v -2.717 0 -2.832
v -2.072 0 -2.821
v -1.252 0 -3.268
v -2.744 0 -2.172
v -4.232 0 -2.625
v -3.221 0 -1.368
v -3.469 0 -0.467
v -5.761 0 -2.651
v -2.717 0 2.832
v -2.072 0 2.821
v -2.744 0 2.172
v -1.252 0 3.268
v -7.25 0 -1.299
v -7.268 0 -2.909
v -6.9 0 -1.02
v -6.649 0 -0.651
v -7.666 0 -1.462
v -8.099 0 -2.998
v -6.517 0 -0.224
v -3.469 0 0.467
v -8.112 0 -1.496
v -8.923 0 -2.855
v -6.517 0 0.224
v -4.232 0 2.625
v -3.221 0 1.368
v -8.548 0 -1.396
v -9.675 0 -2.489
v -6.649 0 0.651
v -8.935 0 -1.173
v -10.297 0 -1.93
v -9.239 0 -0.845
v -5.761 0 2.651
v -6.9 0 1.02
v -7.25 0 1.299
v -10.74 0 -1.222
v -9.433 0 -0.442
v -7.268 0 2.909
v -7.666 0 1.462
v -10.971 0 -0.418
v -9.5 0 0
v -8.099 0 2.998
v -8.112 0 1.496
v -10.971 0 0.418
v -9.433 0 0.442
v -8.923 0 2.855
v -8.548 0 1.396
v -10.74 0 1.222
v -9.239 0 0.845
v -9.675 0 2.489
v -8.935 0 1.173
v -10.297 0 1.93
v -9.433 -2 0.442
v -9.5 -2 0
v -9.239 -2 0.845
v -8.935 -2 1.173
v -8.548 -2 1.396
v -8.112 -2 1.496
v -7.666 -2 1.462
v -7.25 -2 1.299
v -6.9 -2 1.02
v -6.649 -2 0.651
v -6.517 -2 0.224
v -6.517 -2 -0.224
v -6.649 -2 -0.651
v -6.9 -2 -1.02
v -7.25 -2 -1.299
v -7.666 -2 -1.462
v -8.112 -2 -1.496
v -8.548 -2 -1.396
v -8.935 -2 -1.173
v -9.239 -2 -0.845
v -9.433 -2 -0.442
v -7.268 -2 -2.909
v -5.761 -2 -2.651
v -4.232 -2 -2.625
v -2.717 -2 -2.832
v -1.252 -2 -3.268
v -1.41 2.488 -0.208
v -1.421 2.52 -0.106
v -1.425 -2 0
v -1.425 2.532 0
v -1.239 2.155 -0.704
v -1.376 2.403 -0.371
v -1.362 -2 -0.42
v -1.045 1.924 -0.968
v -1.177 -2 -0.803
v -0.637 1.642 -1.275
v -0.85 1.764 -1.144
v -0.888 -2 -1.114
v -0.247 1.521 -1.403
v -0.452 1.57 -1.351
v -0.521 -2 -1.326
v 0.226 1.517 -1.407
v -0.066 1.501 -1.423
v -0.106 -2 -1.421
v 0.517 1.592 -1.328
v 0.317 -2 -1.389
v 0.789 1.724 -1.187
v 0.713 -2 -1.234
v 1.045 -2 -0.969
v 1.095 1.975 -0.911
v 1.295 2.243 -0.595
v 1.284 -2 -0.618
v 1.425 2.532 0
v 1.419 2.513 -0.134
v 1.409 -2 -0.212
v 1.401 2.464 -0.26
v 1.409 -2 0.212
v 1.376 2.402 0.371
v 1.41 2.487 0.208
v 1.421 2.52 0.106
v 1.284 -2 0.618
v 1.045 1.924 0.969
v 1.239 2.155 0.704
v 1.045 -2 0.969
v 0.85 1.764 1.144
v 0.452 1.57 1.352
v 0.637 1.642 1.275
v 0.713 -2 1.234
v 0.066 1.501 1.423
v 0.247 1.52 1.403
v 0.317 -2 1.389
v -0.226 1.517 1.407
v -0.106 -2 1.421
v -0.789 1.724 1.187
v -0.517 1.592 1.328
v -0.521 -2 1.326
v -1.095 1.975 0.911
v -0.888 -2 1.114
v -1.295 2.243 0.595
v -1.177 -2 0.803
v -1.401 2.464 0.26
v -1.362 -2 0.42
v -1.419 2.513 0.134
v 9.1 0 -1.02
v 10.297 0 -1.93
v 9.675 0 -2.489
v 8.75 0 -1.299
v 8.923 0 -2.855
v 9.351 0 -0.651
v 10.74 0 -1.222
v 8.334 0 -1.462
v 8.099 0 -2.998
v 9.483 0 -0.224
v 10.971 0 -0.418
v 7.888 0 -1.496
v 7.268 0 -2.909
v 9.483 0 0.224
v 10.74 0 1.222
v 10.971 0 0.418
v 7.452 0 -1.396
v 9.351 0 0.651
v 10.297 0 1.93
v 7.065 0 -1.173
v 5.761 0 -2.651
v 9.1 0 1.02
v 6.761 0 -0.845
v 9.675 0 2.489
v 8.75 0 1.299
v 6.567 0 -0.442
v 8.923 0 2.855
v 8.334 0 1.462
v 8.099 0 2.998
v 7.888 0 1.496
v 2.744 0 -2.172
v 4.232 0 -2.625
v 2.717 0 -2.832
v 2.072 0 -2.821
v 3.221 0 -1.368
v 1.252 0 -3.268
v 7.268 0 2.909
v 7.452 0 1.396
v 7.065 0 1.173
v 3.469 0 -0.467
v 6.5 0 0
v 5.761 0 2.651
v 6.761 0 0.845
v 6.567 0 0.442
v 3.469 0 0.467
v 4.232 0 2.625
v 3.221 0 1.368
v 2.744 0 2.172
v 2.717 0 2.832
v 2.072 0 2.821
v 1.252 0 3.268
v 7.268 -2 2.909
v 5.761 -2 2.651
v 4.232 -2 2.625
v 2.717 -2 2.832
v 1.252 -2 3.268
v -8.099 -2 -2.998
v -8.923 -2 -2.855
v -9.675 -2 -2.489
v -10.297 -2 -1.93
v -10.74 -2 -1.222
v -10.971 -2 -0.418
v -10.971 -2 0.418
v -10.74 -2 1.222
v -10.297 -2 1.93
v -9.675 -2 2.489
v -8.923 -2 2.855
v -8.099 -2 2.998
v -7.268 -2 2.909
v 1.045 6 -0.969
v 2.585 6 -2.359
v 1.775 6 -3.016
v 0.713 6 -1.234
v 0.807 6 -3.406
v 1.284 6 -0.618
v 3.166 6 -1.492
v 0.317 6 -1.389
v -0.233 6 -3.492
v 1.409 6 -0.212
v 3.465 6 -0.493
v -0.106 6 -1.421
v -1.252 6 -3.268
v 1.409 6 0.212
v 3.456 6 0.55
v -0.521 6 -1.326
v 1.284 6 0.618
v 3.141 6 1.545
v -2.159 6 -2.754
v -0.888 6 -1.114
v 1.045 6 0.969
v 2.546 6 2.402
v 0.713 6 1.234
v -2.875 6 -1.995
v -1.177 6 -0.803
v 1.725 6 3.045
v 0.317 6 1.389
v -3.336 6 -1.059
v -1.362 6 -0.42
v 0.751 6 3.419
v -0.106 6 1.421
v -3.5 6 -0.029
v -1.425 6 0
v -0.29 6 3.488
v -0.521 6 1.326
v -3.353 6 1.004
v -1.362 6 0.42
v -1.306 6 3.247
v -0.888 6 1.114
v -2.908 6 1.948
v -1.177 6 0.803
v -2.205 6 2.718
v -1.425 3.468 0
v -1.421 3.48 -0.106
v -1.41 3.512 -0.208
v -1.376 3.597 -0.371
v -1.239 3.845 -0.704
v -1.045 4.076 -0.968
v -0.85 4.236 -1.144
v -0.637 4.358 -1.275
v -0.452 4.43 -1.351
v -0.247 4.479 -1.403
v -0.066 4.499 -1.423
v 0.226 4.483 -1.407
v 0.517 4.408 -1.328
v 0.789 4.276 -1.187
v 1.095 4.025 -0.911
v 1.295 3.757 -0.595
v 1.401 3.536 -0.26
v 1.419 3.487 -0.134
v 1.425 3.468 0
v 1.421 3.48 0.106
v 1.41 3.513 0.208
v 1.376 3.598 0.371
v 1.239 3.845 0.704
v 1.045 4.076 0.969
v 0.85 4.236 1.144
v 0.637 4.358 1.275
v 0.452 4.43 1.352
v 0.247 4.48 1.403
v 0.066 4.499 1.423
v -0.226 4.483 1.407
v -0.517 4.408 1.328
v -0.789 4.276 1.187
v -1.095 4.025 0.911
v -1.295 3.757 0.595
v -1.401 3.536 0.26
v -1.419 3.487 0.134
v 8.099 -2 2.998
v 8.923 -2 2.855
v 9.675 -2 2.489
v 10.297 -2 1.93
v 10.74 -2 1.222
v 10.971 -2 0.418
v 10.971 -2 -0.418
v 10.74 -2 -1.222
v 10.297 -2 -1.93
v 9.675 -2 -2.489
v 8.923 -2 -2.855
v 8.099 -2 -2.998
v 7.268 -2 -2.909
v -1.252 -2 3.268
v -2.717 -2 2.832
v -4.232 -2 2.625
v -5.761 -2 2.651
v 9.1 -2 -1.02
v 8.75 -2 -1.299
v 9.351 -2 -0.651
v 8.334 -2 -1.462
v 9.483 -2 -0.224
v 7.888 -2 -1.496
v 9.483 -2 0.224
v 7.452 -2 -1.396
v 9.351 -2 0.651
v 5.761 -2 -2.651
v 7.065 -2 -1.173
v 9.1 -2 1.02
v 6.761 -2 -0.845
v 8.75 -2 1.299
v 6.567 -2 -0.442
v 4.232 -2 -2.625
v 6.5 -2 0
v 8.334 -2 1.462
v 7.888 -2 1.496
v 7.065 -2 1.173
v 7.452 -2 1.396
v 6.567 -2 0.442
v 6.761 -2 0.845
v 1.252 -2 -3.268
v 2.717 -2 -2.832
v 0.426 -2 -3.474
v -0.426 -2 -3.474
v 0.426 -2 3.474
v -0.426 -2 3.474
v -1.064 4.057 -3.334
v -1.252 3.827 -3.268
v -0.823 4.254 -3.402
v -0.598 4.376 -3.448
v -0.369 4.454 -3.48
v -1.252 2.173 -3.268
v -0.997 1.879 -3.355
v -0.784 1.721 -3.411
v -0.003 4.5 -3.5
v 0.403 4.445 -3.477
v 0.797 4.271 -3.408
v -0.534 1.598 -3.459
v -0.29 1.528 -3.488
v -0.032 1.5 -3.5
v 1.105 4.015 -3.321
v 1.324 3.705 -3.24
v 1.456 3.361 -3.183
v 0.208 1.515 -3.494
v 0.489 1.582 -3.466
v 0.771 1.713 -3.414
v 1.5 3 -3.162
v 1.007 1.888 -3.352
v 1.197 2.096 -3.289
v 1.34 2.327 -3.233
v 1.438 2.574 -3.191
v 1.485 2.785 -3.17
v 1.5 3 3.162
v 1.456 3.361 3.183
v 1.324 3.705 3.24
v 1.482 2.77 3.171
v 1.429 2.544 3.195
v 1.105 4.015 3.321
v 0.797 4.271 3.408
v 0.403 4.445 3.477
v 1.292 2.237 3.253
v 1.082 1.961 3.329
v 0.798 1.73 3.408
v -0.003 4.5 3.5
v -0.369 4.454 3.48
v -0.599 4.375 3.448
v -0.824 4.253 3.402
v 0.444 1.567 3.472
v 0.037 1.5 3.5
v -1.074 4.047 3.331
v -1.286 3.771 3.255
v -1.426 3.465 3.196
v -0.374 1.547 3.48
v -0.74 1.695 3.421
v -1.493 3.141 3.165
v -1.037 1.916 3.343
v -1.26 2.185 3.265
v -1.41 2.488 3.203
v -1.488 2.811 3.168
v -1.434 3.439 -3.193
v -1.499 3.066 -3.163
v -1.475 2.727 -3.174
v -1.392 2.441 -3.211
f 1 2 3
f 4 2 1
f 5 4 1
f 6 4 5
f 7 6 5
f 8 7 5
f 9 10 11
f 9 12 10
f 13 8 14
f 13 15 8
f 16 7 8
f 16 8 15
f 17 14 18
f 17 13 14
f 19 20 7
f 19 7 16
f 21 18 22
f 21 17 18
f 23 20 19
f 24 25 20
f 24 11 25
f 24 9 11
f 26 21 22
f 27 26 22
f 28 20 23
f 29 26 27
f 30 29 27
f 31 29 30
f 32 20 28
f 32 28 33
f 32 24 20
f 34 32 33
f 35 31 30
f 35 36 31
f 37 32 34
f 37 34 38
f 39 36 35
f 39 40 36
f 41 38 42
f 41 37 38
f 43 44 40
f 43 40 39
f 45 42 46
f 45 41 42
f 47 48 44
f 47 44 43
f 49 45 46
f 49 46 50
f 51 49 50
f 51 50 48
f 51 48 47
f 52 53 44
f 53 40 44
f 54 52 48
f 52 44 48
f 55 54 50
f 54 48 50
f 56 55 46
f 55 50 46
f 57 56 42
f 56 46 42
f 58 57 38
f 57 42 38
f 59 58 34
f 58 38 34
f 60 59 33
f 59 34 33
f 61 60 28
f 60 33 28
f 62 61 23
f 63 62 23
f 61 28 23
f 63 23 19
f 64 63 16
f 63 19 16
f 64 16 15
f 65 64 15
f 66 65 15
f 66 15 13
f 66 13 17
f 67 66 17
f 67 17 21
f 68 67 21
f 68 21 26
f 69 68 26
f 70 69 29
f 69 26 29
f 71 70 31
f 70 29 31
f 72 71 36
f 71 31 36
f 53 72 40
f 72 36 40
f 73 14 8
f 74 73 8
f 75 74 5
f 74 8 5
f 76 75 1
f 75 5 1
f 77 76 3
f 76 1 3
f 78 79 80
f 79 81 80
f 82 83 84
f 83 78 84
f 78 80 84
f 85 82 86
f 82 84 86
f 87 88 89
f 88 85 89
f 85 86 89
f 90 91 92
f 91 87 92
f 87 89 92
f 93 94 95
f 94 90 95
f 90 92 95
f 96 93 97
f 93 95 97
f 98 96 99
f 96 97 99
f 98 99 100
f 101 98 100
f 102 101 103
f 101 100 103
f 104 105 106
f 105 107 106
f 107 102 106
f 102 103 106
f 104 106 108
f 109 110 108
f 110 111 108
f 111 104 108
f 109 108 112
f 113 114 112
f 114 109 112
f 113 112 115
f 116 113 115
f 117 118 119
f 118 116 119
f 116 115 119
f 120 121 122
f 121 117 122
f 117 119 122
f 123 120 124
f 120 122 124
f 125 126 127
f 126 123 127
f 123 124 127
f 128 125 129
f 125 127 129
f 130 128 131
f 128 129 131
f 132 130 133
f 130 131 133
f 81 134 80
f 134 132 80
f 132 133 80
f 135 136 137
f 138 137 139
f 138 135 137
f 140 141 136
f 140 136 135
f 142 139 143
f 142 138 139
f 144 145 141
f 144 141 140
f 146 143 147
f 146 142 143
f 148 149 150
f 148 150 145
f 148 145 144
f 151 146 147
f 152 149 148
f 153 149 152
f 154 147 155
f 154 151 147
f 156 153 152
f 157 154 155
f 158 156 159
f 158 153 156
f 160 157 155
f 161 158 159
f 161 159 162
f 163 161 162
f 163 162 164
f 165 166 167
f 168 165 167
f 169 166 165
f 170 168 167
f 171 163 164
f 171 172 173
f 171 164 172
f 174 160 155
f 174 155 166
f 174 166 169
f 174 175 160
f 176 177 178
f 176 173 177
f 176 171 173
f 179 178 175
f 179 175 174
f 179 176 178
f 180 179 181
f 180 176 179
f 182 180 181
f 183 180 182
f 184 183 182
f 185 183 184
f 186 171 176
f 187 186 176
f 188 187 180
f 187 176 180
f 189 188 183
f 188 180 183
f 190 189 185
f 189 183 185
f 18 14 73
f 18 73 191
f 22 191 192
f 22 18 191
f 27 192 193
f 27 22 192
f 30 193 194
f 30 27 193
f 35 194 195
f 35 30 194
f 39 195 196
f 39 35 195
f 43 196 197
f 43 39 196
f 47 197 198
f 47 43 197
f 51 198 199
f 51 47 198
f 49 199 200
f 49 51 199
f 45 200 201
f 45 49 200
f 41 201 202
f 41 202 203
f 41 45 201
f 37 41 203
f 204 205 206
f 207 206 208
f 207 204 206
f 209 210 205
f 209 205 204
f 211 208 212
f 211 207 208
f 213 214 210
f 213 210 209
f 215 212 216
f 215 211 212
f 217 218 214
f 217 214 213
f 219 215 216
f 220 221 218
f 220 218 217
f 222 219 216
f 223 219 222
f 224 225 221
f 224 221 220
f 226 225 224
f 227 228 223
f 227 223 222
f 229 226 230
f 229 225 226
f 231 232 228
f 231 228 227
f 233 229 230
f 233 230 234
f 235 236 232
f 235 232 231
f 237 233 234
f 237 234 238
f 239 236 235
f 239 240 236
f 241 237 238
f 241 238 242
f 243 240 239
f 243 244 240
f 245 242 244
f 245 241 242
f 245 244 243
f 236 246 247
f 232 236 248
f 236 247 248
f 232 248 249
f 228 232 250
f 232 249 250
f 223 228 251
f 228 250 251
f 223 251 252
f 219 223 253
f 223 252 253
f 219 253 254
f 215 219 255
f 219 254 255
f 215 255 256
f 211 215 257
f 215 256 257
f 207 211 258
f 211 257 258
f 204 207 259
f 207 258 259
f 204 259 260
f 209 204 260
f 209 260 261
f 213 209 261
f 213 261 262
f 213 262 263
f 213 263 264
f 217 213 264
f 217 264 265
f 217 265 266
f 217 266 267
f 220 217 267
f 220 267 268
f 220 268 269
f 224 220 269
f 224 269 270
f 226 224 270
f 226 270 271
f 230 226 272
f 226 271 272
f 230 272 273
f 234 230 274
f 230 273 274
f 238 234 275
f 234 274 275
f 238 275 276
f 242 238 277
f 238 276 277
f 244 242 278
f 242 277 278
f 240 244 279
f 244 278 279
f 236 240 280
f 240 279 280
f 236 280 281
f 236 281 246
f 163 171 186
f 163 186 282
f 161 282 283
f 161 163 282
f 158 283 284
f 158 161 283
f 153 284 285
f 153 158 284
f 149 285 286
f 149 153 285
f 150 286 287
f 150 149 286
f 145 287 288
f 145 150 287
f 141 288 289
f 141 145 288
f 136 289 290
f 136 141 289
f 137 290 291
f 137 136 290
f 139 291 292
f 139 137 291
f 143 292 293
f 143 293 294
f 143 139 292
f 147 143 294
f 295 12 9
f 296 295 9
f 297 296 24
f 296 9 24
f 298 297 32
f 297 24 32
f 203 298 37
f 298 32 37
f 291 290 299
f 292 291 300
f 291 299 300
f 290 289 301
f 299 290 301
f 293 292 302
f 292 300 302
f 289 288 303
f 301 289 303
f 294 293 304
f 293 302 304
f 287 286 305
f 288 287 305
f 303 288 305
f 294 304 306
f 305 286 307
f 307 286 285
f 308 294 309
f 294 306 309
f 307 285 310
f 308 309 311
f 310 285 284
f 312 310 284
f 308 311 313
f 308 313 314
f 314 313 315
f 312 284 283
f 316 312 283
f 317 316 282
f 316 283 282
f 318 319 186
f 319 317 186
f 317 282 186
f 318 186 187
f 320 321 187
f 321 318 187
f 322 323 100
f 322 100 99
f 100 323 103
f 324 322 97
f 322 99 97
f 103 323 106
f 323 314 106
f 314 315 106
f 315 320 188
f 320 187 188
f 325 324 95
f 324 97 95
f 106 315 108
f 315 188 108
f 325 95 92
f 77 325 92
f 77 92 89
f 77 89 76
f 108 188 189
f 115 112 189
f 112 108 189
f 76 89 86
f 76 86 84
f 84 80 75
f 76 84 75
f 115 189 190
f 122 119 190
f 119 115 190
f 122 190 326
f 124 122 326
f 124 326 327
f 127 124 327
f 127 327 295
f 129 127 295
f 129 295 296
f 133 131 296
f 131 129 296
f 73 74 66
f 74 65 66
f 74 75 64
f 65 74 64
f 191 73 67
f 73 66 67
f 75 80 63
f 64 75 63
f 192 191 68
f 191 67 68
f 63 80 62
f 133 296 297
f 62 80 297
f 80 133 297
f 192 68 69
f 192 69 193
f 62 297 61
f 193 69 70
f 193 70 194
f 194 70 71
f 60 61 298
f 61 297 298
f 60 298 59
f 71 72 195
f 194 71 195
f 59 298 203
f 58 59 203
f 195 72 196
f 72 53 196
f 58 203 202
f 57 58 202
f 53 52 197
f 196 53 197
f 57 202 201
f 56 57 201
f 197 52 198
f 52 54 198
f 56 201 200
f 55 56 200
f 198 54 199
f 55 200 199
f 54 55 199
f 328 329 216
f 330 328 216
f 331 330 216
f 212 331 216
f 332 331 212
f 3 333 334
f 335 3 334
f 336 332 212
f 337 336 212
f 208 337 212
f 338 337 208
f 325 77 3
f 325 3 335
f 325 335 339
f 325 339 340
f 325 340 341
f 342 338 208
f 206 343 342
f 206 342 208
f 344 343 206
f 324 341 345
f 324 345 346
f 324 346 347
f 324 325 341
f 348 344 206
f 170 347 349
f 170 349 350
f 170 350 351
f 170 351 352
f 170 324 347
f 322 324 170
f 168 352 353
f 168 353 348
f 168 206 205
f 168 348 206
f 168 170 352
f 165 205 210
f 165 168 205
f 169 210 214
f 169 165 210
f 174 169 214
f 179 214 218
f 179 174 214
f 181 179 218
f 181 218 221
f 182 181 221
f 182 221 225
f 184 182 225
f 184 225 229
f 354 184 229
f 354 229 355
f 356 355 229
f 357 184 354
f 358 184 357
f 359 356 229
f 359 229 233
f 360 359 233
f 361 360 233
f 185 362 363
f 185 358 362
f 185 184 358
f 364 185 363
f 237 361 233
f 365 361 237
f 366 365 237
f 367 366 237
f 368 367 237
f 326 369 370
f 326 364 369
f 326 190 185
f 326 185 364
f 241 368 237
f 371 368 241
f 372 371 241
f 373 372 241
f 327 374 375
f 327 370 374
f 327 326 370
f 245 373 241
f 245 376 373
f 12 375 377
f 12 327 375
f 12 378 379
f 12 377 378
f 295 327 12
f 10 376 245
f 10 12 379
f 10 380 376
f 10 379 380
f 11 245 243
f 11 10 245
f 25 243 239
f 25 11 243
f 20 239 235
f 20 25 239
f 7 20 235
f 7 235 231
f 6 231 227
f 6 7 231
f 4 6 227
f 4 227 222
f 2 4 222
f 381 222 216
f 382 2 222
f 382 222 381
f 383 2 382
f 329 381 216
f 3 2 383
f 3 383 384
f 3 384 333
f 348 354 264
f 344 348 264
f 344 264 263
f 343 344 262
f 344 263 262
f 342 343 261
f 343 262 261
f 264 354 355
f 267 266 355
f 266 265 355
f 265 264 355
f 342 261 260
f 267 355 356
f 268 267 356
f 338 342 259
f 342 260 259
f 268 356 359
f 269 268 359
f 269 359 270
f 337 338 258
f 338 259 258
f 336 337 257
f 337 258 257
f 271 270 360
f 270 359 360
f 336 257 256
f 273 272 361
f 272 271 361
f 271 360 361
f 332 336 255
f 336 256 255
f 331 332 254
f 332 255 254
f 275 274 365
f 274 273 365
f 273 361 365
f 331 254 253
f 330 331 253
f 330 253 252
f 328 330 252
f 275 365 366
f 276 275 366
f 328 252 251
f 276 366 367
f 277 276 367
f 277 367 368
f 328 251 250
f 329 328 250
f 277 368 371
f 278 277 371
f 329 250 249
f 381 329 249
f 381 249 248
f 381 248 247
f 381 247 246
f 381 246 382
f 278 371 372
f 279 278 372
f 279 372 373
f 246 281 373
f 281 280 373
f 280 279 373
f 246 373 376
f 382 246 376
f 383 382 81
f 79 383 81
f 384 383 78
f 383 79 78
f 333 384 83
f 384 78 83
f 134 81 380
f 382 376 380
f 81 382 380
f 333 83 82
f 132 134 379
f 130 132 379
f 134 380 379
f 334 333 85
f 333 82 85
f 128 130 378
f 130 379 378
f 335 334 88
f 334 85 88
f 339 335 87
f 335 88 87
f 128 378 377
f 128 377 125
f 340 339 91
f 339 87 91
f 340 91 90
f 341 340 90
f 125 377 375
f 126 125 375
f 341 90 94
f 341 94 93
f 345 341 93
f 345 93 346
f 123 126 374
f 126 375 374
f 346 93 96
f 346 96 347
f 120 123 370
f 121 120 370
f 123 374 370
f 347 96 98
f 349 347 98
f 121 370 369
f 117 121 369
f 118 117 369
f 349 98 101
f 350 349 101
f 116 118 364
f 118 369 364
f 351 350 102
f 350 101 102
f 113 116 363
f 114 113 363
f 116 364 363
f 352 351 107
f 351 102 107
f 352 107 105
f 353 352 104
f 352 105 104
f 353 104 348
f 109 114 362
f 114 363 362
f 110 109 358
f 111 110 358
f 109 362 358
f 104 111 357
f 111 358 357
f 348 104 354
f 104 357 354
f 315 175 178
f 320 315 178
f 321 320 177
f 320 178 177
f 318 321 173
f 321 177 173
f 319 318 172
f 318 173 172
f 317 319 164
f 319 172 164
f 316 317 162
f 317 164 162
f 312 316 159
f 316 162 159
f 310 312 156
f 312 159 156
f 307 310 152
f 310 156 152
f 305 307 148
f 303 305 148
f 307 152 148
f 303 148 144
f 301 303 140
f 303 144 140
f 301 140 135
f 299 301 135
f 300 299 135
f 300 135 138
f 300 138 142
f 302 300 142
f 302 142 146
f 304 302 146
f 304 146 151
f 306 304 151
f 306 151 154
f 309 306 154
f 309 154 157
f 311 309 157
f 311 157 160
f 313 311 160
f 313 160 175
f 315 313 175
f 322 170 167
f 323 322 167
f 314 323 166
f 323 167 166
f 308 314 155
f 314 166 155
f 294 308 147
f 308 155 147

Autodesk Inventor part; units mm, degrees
ref_plane "YZ Plane" through (0, 0, 0) normal (1, 0, 0) x (0, 1, 0)
ref_plane "XZ Plane" through (0, 0, 0) normal (0, 1, 0) x (-1, 0, 0)
sketch "Sketch1" plane through (0, 0, 0) normal (0, 1, 0) x (-1, 0, 0)
  circle A0 centre (0, 0) radius 1.425
  arc A1 (1.2517, 3.2685) -> (1.2517, -3.2685) centre (0, 0) ccw
  circle A2 centre (8, 0) radius 1.5
  circle A3 centre (-8, 0) radius 1.5
  arc A4 (-7.268, 2.9093) -> (-7.268, -2.9093) centre (-8, 0) ccw
  arc A5 (-1.2517, -3.2685) -> (-7.268, -2.9093) centre (-4.8281, -12.6071) ccw
  arc A6 (-7.268, 2.9093) -> (-1.2517, 3.2685) centre (-4.8281, 12.6071) ccw
  line L0 (0, 0) -> (0, -3.5) construction
  arc A7 (7.268, -2.9093) -> (7.268, 2.9093) centre (8, 0) ccw
  arc A8 (7.268, -2.9093) -> (1.2517, -3.2685) centre (4.8281, -12.6071) ccw
  arc A9 (1.2517, 3.2685) -> (7.268, 2.9093) centre (4.8281, 12.6071) ccw
  arc A10 (1.2517, -3.2685) -> (1.2517, 3.2685) centre (0, 0) ccw
  dimension "d0" = 2.85
  dimension "d1" = 7
  dimension "d2" = 3
  dimension "d3" = 3
  dimension "d4" = 8
  dimension "d5" = 8
  dimension "d6" = 3
  dimension "d14" = 10
extrude "Extrusion1" add sketch "Sketch1" against normal blind 2
extrude "Extrusion2" add sketch "Sketch1" along normal blind 6 contours A10 A1
sketch "Sketch2" plane through (0, 0, 0) normal (0, 0, 1) x (1, 0, 0)
  circle A0 centre (0, 3) radius 1.5
  line L0 (3.5, 6) -> (3.5, 0) projected
  point P0 (0, 0)
  point P1 (3.5, 3)
  dimension "d11" = 3
extrude "Extrusion3" cut sketch "Sketch2" along normal through all both and the other way through all
ref_plane "Work Plane1" through (0, 0, 3.5) normal (0, 0, 1) x (1, 0, 0)
properties part number "EncoderWheelAdapter" material "ABS Plastic"
